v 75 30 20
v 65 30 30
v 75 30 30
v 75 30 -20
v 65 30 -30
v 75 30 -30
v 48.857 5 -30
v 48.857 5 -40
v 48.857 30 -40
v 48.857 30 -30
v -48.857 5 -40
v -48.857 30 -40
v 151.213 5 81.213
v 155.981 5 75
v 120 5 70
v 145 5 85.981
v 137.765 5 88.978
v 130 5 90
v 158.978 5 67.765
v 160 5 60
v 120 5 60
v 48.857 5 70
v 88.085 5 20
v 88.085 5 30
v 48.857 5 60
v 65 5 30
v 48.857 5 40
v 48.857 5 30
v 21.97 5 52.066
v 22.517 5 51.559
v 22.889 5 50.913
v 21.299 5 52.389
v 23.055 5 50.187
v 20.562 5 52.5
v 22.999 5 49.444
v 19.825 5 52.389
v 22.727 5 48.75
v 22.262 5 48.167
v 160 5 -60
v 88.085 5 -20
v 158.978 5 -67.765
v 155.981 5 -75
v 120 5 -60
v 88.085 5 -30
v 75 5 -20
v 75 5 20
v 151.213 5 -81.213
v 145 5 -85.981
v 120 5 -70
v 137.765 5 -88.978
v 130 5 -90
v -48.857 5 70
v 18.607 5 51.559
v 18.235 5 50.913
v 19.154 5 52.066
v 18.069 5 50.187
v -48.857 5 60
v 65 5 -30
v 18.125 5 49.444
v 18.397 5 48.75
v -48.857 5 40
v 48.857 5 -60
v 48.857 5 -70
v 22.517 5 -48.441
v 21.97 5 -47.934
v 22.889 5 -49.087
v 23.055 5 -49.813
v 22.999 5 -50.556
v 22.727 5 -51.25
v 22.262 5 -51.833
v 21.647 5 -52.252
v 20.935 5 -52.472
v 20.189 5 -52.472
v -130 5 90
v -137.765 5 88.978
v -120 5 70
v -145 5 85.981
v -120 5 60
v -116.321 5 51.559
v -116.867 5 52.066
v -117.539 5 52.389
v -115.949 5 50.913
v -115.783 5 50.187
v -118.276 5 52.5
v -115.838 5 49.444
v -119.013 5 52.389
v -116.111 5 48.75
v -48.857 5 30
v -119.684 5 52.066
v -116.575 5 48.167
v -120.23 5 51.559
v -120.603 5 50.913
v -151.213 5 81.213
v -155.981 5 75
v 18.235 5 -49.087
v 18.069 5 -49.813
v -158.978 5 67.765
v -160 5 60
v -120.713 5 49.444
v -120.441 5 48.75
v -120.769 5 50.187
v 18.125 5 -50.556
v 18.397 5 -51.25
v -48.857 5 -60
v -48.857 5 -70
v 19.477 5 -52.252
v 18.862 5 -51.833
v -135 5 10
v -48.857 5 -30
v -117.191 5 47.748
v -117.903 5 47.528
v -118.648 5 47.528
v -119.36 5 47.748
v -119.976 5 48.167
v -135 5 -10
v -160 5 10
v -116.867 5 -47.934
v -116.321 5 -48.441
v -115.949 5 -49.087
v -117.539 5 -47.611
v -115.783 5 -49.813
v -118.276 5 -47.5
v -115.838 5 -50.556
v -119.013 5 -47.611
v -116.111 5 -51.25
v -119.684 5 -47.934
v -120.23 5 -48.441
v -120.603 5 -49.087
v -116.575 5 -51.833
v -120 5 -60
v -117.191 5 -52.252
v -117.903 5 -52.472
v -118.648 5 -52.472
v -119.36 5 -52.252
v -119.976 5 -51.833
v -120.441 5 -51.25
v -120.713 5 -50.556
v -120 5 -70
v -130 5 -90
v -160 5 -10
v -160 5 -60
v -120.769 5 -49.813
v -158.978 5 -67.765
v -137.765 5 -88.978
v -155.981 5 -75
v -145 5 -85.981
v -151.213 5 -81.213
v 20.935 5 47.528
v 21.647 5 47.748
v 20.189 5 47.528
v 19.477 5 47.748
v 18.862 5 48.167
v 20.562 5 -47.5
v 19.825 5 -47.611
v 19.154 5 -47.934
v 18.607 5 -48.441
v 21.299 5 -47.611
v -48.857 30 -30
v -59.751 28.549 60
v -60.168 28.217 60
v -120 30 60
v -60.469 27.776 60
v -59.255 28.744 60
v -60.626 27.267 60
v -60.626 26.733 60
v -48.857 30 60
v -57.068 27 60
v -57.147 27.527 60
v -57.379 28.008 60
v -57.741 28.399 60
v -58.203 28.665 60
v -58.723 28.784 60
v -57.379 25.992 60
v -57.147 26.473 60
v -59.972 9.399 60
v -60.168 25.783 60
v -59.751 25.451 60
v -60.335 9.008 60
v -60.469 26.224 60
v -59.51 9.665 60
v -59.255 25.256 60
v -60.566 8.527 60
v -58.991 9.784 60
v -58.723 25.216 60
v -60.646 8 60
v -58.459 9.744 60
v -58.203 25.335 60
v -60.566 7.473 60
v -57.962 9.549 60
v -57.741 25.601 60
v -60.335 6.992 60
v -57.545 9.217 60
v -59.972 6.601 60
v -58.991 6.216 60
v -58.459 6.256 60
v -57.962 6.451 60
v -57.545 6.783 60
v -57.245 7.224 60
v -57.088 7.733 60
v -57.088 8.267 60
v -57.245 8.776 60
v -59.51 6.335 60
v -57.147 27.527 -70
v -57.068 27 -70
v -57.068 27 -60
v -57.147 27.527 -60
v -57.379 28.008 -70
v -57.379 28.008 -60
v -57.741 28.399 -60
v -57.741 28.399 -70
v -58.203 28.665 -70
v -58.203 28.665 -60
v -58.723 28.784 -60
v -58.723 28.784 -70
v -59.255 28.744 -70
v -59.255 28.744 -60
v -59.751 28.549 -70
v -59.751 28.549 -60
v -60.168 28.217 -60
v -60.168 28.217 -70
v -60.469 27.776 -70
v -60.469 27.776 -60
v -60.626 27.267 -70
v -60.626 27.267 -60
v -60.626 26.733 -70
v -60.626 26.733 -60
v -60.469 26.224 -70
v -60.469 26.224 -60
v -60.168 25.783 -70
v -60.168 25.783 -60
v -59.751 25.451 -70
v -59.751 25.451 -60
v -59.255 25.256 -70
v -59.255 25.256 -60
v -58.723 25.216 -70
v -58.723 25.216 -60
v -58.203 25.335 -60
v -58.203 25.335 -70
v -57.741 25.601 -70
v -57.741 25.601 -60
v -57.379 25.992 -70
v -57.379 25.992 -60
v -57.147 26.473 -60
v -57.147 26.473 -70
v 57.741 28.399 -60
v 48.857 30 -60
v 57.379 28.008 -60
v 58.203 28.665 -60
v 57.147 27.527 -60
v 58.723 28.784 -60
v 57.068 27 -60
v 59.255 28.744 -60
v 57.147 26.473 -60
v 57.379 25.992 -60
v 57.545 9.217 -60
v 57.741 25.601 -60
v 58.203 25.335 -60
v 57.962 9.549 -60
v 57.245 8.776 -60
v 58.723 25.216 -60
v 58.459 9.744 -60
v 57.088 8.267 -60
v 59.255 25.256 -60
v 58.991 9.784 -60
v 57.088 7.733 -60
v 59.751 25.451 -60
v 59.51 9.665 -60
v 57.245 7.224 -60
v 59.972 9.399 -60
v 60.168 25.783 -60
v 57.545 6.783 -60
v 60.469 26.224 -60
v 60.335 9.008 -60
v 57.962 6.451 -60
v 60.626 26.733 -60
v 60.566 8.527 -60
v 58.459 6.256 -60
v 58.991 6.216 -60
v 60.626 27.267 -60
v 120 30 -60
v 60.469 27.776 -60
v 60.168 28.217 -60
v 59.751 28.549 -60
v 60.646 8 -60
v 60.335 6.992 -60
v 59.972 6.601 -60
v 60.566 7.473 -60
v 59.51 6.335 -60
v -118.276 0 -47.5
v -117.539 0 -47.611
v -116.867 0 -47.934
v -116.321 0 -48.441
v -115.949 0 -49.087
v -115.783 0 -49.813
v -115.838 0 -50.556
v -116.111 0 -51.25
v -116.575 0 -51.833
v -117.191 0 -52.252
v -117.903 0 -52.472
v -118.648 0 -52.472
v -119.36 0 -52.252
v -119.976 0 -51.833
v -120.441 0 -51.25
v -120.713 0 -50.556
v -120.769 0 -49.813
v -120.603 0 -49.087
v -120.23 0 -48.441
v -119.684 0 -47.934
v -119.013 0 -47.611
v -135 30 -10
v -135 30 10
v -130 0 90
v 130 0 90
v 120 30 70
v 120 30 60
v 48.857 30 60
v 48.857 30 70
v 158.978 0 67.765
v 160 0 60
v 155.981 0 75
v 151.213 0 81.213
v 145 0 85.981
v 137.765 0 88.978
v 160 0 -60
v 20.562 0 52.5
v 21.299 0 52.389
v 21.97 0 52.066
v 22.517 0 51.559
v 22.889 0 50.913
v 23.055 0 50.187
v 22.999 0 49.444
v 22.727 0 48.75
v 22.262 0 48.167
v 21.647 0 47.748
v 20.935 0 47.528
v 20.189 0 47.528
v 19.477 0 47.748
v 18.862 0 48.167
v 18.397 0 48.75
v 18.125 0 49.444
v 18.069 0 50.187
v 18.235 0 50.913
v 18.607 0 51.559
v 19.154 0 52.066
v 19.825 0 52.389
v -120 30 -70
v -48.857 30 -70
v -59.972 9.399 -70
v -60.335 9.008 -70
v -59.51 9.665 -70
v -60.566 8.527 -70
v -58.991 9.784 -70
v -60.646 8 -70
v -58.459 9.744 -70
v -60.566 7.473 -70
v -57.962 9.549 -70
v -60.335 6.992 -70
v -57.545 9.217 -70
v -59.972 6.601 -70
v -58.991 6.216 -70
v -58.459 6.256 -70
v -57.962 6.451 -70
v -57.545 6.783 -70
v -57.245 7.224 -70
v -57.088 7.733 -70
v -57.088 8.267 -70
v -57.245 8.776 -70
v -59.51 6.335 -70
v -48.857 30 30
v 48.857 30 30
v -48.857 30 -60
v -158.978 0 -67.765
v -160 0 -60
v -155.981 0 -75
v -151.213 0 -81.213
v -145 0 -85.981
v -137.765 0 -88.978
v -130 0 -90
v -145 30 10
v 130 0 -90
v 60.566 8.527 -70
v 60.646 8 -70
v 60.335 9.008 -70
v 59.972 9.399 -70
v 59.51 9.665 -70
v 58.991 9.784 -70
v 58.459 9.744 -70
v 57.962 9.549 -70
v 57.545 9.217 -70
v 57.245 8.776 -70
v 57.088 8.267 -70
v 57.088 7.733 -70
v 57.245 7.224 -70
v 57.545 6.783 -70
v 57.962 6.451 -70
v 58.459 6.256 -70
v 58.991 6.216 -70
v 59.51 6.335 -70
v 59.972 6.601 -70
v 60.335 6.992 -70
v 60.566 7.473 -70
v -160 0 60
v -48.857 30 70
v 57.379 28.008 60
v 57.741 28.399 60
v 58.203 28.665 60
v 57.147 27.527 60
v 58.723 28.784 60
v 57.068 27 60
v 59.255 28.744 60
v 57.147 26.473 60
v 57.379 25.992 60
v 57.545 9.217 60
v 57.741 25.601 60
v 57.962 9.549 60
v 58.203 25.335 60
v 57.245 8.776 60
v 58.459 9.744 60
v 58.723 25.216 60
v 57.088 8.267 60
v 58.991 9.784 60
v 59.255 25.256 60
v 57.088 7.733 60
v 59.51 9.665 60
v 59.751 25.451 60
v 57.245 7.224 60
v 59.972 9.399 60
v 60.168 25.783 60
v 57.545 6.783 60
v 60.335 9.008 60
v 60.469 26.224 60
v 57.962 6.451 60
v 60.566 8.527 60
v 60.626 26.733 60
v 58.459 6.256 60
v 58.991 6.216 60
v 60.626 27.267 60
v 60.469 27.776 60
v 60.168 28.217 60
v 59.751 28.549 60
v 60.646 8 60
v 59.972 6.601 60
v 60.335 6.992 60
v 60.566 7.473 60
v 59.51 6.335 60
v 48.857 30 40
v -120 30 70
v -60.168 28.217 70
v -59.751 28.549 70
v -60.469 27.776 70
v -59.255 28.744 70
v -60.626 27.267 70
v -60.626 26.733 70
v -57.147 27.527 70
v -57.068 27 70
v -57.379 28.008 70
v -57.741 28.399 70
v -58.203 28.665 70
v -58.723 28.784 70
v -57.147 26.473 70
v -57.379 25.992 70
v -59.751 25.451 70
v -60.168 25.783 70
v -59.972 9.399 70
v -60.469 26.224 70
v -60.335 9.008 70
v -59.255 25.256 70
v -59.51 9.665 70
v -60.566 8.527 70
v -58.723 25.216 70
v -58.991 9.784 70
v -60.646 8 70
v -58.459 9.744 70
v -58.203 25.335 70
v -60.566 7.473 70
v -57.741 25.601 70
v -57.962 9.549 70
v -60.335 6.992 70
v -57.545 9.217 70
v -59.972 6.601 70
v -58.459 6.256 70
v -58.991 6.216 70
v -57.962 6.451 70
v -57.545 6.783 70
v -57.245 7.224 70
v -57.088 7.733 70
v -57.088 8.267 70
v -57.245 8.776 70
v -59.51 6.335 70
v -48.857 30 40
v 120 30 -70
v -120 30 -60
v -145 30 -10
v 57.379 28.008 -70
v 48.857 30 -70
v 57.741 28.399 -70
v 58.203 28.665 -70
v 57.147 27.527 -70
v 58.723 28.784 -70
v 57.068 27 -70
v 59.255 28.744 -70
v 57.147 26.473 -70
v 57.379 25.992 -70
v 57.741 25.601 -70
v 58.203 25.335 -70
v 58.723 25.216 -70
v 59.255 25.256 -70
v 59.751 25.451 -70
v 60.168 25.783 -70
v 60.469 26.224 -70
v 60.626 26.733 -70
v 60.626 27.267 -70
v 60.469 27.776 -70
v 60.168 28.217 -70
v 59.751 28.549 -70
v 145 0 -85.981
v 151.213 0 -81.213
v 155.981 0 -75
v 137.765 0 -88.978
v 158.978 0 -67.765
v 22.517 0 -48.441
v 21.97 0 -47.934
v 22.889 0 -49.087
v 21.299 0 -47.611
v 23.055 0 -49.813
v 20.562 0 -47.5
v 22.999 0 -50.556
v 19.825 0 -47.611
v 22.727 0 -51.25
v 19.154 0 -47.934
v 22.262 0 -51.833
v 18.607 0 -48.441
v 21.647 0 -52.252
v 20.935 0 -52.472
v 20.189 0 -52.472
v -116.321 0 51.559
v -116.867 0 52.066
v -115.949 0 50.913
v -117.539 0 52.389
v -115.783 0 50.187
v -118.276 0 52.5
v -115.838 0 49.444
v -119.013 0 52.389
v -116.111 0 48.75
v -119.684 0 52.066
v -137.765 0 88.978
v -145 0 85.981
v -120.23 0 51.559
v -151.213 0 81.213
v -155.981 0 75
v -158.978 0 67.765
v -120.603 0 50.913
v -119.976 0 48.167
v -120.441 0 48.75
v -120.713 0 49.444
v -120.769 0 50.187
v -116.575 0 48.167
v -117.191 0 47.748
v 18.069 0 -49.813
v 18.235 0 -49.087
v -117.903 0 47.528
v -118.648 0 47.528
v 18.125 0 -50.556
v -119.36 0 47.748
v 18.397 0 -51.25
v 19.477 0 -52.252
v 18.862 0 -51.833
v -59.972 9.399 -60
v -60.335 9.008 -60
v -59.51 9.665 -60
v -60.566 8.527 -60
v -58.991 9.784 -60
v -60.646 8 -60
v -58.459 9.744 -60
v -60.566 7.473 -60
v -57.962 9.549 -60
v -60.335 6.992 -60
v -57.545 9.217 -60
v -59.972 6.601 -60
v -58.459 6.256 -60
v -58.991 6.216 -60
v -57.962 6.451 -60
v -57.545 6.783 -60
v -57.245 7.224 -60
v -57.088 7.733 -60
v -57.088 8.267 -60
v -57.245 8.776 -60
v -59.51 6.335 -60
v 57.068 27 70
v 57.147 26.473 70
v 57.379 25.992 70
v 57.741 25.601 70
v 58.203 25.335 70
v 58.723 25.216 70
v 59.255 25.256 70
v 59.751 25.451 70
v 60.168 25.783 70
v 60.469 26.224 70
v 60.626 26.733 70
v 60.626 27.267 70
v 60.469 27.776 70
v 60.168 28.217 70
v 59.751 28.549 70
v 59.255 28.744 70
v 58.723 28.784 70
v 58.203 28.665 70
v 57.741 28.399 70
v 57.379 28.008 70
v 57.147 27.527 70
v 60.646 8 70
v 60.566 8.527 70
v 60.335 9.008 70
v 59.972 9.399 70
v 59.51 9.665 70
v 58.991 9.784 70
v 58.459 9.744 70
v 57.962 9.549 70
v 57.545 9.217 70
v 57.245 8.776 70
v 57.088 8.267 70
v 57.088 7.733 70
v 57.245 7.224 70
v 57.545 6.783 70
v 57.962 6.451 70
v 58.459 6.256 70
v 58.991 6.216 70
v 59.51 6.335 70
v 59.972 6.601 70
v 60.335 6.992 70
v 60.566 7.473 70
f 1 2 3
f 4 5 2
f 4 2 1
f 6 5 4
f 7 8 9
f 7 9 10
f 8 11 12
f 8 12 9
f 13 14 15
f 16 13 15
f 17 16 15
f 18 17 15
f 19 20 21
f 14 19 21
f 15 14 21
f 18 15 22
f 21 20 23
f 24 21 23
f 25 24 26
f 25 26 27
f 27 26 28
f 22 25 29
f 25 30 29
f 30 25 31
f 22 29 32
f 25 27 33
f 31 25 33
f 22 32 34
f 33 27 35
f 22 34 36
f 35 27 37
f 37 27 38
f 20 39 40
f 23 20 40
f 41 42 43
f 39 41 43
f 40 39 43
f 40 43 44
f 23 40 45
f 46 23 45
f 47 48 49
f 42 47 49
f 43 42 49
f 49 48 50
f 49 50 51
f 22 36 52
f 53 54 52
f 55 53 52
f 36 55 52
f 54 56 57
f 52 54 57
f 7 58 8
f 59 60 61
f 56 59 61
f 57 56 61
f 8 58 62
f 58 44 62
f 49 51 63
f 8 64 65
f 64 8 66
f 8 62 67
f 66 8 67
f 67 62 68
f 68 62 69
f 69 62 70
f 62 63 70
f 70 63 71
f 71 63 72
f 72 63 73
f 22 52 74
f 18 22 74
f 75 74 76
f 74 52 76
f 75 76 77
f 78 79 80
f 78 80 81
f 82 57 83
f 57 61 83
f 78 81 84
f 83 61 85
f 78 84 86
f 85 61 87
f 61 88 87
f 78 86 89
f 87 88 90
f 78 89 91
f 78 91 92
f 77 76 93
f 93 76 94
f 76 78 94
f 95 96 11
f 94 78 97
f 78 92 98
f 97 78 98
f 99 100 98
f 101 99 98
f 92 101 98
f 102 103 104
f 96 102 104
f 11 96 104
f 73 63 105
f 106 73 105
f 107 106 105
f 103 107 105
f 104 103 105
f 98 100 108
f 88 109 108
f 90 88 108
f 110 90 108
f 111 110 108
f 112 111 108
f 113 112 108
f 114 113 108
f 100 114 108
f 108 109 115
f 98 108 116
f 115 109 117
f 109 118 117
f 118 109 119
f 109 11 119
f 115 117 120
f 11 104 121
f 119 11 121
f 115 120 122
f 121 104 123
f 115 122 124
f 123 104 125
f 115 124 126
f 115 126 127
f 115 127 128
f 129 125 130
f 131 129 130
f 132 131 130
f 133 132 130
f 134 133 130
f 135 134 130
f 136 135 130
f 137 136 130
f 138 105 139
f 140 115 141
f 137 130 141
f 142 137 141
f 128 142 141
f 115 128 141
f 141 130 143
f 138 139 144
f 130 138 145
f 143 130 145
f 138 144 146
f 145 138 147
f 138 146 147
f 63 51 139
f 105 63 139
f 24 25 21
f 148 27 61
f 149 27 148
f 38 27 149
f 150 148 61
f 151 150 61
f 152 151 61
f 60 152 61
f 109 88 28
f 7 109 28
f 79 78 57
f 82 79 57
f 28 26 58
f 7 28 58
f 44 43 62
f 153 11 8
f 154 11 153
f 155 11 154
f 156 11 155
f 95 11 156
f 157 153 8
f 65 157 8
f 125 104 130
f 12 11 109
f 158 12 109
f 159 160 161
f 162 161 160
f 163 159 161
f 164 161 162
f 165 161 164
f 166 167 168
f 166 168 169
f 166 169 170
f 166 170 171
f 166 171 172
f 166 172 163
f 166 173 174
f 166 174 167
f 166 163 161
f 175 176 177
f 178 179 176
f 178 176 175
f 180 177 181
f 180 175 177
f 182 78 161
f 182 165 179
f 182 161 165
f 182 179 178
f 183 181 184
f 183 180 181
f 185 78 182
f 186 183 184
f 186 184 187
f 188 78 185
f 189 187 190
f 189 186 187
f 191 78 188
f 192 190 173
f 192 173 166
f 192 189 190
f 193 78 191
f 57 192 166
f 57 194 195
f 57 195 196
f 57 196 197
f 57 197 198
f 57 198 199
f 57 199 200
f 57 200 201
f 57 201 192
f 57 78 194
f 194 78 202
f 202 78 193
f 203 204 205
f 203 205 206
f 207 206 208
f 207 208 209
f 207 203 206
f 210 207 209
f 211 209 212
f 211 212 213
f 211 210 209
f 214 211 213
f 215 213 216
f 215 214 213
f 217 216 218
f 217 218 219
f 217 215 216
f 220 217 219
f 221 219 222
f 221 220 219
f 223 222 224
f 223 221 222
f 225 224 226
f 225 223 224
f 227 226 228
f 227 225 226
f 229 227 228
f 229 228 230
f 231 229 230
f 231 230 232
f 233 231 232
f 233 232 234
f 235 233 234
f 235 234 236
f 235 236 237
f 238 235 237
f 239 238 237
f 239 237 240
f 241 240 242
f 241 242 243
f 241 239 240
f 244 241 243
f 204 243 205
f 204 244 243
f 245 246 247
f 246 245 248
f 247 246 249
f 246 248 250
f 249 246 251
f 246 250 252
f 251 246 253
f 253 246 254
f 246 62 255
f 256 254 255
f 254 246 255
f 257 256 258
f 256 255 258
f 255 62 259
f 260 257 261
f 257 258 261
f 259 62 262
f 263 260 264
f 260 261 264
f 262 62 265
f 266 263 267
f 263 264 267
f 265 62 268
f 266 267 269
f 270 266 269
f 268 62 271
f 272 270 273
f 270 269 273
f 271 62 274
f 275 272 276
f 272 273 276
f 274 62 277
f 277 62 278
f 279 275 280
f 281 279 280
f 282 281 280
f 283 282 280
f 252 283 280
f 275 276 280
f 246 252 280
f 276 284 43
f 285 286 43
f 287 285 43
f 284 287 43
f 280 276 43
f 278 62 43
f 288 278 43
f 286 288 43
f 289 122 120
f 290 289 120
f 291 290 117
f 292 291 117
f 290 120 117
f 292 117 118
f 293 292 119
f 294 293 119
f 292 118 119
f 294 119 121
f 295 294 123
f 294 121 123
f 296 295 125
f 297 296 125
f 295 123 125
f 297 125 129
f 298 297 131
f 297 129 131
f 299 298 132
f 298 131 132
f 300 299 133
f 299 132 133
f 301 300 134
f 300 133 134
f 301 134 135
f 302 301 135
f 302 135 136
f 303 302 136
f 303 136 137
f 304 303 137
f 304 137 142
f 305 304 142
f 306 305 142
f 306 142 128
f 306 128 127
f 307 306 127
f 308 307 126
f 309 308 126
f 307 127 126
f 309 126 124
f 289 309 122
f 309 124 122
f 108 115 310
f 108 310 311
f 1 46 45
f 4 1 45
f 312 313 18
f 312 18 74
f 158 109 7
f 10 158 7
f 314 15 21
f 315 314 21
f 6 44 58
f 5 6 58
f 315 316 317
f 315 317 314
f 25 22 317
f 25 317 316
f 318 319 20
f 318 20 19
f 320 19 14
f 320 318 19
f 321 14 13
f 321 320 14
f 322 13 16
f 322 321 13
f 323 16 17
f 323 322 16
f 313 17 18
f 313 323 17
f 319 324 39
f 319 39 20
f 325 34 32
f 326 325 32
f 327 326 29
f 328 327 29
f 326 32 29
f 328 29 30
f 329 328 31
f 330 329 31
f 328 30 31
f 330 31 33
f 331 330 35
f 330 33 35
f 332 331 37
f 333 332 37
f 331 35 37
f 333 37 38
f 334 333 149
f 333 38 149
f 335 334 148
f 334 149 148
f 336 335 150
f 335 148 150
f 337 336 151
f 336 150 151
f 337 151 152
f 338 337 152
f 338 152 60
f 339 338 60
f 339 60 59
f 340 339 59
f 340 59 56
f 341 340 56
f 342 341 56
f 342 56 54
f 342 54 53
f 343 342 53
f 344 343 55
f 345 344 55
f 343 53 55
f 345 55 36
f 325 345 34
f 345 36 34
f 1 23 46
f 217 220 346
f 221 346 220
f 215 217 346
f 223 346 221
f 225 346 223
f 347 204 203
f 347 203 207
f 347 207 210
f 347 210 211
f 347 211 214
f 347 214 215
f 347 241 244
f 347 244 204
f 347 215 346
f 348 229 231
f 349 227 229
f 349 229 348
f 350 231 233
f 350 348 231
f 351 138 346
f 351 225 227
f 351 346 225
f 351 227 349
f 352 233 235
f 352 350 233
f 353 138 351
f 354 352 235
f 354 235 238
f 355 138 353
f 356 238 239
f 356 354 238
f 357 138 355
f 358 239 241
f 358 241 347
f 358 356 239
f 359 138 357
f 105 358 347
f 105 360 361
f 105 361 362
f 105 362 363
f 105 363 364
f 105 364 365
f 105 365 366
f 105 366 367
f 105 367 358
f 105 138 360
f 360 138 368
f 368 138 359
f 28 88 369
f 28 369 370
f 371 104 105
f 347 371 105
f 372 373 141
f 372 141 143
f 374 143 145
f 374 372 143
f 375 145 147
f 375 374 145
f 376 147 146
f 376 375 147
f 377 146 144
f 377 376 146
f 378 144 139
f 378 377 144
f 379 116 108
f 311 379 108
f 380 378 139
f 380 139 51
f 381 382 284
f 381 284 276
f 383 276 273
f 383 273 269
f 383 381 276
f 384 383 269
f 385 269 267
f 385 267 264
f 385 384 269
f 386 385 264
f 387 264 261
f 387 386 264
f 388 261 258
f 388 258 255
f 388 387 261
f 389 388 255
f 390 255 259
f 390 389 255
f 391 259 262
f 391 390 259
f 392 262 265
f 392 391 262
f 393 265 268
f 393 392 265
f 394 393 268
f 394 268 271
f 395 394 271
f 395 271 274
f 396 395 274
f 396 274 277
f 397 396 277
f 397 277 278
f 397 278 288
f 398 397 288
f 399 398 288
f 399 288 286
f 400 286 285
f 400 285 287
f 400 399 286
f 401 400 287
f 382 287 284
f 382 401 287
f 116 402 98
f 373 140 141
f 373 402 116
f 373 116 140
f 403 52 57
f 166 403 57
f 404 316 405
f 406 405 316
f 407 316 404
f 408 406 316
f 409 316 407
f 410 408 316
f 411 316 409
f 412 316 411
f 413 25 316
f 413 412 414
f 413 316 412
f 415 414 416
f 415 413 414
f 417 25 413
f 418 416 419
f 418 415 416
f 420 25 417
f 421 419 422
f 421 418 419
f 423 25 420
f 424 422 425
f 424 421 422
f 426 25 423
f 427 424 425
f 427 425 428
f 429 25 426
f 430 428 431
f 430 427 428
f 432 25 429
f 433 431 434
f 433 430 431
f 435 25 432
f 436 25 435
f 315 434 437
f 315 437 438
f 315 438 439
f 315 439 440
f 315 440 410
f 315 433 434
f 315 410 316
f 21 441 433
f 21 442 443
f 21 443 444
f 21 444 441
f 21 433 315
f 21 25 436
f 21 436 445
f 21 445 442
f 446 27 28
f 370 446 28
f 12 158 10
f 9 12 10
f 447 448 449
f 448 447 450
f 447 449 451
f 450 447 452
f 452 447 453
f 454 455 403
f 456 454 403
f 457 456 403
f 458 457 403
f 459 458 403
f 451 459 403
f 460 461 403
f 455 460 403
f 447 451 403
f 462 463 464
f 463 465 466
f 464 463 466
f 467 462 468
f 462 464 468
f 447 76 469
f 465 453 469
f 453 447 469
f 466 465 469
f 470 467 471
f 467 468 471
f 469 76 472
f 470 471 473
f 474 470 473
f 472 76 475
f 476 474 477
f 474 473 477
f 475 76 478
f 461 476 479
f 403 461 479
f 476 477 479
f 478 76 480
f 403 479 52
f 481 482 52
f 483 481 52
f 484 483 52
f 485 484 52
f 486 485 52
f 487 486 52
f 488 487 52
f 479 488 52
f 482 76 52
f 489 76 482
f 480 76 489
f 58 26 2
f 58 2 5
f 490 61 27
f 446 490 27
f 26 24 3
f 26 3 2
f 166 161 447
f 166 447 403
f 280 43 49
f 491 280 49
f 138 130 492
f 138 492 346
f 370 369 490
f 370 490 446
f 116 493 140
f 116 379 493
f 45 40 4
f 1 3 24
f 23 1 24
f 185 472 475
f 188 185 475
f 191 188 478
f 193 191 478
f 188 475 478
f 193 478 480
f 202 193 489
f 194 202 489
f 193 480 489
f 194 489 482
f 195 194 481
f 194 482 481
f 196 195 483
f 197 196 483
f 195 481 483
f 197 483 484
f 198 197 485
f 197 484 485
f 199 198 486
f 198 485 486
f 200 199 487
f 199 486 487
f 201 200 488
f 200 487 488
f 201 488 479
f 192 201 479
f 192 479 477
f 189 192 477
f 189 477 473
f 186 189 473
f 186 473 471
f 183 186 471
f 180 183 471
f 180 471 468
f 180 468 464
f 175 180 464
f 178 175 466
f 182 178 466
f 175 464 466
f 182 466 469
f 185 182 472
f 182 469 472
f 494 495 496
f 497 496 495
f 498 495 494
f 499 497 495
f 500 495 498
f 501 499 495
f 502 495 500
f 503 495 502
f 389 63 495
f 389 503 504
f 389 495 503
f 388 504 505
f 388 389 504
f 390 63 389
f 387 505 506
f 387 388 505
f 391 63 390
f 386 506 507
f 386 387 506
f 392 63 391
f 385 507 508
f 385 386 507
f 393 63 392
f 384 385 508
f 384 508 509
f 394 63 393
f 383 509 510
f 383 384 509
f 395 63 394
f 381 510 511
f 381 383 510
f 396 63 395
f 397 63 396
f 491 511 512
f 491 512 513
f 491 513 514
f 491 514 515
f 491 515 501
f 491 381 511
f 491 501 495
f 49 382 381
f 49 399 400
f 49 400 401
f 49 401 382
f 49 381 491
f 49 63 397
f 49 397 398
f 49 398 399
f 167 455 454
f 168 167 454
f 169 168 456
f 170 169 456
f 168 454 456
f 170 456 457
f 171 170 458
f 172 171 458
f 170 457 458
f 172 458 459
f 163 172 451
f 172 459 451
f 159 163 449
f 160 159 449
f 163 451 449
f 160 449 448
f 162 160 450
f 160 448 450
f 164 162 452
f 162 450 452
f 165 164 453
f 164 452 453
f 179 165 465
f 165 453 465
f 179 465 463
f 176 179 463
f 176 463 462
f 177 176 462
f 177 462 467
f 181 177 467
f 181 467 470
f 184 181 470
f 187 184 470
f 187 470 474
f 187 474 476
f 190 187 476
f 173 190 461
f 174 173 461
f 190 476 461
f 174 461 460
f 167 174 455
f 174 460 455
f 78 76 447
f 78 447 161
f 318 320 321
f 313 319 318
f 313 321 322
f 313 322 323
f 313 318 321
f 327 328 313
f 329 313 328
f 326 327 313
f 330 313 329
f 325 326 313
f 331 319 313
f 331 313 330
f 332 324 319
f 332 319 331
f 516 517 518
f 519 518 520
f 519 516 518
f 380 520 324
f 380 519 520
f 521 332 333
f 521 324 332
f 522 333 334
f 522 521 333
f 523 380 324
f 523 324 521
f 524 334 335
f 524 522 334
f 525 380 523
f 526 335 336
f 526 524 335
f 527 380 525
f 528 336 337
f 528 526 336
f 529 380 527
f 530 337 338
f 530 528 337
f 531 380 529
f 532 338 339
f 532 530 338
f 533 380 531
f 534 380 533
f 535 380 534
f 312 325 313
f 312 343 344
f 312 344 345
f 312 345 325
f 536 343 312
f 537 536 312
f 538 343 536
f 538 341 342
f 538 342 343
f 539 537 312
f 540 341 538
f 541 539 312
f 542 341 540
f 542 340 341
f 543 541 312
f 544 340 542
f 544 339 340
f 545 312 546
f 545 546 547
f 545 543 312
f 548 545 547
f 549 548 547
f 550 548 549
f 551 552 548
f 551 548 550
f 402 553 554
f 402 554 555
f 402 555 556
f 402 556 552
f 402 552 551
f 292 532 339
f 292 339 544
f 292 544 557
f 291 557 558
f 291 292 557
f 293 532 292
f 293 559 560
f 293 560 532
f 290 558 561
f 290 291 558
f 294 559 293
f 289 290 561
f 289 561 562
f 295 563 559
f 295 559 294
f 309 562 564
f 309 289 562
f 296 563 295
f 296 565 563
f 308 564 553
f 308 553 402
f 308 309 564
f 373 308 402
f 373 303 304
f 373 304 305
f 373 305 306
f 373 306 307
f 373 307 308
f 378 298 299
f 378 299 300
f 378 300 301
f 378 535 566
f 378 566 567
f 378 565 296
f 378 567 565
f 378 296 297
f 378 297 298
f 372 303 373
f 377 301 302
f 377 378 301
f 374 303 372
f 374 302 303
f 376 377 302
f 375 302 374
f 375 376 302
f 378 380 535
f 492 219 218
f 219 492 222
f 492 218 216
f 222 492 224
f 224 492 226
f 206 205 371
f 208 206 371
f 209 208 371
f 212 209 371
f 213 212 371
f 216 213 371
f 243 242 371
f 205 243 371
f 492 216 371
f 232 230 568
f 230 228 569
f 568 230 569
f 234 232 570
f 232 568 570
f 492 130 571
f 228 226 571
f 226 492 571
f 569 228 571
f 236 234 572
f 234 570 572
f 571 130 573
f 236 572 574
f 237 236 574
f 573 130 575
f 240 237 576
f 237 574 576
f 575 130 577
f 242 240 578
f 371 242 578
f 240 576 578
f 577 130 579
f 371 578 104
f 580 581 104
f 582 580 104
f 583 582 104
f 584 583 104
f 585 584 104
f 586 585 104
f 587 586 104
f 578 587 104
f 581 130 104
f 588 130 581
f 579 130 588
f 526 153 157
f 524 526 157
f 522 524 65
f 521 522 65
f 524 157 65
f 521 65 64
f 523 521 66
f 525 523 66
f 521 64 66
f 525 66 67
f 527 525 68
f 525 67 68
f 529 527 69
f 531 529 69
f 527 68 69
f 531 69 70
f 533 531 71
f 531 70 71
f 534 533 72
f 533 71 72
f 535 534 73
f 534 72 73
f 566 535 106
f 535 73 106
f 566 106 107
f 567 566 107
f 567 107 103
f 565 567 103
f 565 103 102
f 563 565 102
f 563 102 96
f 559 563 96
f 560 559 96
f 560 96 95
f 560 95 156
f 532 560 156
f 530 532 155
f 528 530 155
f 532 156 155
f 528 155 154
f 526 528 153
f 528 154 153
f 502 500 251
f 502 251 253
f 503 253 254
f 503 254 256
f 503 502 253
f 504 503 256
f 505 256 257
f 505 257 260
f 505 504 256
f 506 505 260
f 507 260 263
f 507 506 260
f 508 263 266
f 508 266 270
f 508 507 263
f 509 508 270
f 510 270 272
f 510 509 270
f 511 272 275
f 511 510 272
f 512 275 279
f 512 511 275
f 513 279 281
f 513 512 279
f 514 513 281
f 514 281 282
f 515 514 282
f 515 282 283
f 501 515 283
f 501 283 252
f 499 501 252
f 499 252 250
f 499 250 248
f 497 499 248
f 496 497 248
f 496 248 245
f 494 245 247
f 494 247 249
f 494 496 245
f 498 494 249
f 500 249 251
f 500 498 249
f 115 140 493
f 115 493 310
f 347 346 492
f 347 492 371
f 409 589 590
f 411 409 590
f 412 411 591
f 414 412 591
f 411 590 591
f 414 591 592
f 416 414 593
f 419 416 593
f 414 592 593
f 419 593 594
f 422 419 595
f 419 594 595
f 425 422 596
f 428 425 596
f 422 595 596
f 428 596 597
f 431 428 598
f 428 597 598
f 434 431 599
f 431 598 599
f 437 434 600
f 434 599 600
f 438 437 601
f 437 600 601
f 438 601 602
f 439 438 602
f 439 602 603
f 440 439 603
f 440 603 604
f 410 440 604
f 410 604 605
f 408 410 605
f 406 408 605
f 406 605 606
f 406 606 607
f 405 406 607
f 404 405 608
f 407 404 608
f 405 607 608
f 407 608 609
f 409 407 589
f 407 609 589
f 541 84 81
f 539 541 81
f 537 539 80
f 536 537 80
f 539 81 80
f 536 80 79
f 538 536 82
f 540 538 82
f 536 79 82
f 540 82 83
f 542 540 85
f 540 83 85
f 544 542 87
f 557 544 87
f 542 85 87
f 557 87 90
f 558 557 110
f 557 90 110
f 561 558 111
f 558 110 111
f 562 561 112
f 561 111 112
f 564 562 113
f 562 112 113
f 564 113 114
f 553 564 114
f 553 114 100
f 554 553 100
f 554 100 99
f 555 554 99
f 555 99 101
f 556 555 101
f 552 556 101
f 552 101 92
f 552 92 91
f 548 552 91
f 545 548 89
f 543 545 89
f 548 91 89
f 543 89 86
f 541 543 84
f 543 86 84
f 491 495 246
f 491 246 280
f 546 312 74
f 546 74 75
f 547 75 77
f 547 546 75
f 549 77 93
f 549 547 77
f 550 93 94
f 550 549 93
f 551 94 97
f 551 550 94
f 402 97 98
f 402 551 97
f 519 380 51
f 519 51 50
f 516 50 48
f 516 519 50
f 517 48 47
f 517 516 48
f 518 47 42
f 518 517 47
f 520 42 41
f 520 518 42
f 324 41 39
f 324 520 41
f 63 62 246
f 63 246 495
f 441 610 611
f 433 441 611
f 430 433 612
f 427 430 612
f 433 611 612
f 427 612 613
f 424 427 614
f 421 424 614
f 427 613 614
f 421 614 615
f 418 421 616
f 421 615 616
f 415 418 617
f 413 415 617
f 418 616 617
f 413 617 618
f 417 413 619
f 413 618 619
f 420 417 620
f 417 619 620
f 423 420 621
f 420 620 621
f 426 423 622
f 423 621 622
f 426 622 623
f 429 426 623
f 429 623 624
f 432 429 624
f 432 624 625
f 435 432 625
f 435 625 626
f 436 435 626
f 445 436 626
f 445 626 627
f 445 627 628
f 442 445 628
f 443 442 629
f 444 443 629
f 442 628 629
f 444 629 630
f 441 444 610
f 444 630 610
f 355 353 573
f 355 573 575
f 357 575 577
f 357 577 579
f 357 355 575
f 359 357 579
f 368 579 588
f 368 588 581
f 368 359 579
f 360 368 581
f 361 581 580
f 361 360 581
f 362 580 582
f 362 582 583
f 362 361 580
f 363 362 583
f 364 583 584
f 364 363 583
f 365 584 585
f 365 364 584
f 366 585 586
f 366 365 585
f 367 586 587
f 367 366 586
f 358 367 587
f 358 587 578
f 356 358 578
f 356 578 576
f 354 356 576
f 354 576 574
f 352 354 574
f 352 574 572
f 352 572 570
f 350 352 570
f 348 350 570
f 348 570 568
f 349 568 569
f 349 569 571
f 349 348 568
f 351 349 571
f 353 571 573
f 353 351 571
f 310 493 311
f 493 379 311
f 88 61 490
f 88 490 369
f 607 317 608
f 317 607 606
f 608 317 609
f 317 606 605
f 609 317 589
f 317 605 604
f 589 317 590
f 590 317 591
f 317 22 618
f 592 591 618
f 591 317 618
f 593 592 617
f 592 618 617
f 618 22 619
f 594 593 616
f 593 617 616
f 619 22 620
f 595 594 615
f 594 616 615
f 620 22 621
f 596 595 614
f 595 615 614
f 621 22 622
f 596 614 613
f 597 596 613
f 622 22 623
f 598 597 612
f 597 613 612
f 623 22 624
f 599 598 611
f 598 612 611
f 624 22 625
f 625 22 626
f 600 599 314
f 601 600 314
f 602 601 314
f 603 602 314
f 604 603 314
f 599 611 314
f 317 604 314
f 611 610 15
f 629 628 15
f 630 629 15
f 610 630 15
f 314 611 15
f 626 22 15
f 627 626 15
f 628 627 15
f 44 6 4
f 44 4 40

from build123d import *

# Parameters (mm, degrees)
BOSS_EXTRUDE1_DEPTH = 5
SKETCH2_W           = 71.143127042
SKETCH2_H           = 10
BOSS_EXTRUDE3_DEPTH = 25
SKETCH3_W           = 10
SKETCH3_H           = 10
BOSS_EXTRUDE4_DEPTH = 25
BOSS_EXTRUDE5_DEPTH = 10
SKETCH6_W           = 10
SKETCH6_H           = 60
BOSS_EXTRUDE6_DEPTH = 25
BOSS_EXTRUDE7_DEPTH = 10
SKETCH9_W           = 97.713745916
SKETCH9_H           = 10
BOSS_EXTRUDE8_DEPTH = 25
SKETCH11_R          = 2.5
CUT_EXTRUDE1_DEPTH  = 5
SKETCH12_R          = 1.788924299
CUT_EXTRUDE2_DEPTH  = 10


with BuildPart() as part:
    # Sketch1 → Boss-Extrude1 (new body)
    with BuildSketch(Plane(origin=(0, 0, 0), x_dir=(1, 0, 0), z_dir=(0, 1, 0))):
        with BuildLine():
            Line((-130, 90), (130, 90))
            ThreePointArc((130, 90), (151.213203436, 81.213203436), (160, 60))
            Line((160, 60), (160, -60))
            ThreePointArc((160, -60), (151.213203436, -81.213203436), (130, -90))
            Line((130, -90), (-130, -90))
            ThreePointArc((-130, -90), (-151.213203436, -81.213203436), (-160, -60))
            Line((-160, -60), (-160, 60))
            ThreePointArc((-160, 60), (-151.213203436, 81.213203436), (-130, 90))
        make_face()
    extrude(amount=BOSS_EXTRUDE1_DEPTH)

    # Sketch2 → Boss-Extrude3 (add)
    with BuildSketch(Plane(origin=(0, 5, 0), x_dir=(1, 0, 0), z_dir=(0, 1, 0))):
        with Locations((-84.428436479, 65)):
            Rectangle(SKETCH2_W, SKETCH2_H)
        with Locations((84.428436479, 65)):
            Rectangle(SKETCH2_W, SKETCH2_H)
        with Locations((84.428436479, -65)):
            Rectangle(SKETCH2_W, SKETCH2_H)
        with Locations((-84.428436479, -65)):
            Rectangle(SKETCH2_W, SKETCH2_H)
    extrude(amount=BOSS_EXTRUDE3_DEPTH)

    # Sketch3 → Boss-Extrude4 (add)
    with BuildSketch(Plane(origin=(0, 5, 0), x_dir=(1, 0, 0), z_dir=(0, 1, 0))):
        with Locations((-140, -5)):
            Rectangle(SKETCH3_W, SKETCH3_H)
    boss_extrude4 = extrude(amount=BOSS_EXTRUDE4_DEPTH)

    # Sketch5 → Boss-Extrude5 (add)
    with BuildSketch(Plane(origin=(0, 0, 0), x_dir=(-1, 0, 0), z_dir=(0, 0, -1))):
        Polygon((145, 5), (145, 30), (160, 5), align=None)
    boss_extrude5 = extrude(amount=-BOSS_EXTRUDE5_DEPTH)

    # Sketch6 → Boss-Extrude6 (add)
    with BuildSketch(Plane(origin=(0, 5, 0), x_dir=(1, 0, 0), z_dir=(0, 1, 0))):
        with Locations((70, 0)):
            Rectangle(SKETCH6_W, SKETCH6_H)
    extrude(amount=BOSS_EXTRUDE6_DEPTH)

    # Sketch8 → Boss-Extrude7 (add)
    with BuildSketch(Plane.XY.offset(30)):
        Polygon((75, 30), (88.085238775, 5), (75, 5), align=None)
    boss_extrude7 = extrude(amount=-BOSS_EXTRUDE7_DEPTH)

    # Mirror1: Boss-Extrude7 across plane
    add(boss_extrude7.mirror(Plane(origin=(0, 0, 0), x_dir=(1, 0, 0), z_dir=(0, 0, -1))))

    # Mirror2: Boss-Extrude4, Boss-Extrude5 across plane
    add(boss_extrude4.mirror(Plane(origin=(-145, 30, 0), x_dir=(1, 0, 0), z_dir=(0, 0, 1))))
    add(boss_extrude5.mirror(Plane(origin=(-145, 30, 0), x_dir=(1, 0, 0), z_dir=(0, 0, 1))))

    # Sketch9 → Boss-Extrude8 (add)
    with BuildSketch(Plane(origin=(0, 5, 0), x_dir=(1, 0, 0), z_dir=(0, 1, 0))):
        with Locations((0, -35)):
            Rectangle(SKETCH9_W, SKETCH9_H)
    boss_extrude8 = extrude(amount=BOSS_EXTRUDE8_DEPTH)

    # Mirror3: Boss-Extrude8 across plane
    add(boss_extrude8.mirror(Plane(origin=(0, 0, 0), x_dir=(1, 0, 0), z_dir=(0, 0, -1))))

    # Sketch11 → Cut-Extrude1 (cut)
    with BuildSketch(Plane(origin=(0, 5, 0), x_dir=(1, 0, 0), z_dir=(0, 1, 0))):
        with Locations(Location((-118.275690488, 50, 0), (0, 0, 270))):
            Circle(SKETCH11_R)
        with Locations(Location((-118.275690488, -50, 0), (0, 0, 270))):
            Circle(SKETCH11_R)
        with Locations(Location((20.561944572, -50, 0), (0, 0, 270))):
            Circle(SKETCH11_R)
        with Locations(Location((20.561944572, 50, 0), (0, 0, 270))):
            Circle(SKETCH11_R)
    extrude(amount=-CUT_EXTRUDE1_DEPTH, mode=Mode.SUBTRACT)

    # Sketch12 → Cut-Extrude2 (cut)
    with BuildSketch(Plane.XY.offset(70)):
        with Locations((-58.856872958, 27)):
            Circle(SKETCH12_R)
        with Locations(Location((-58.856872958, 8, 0), (0, 0, 180))):
            Circle(SKETCH12_R)
        with Locations((58.856872958, 8)):
            Circle(SKETCH12_R)
        with Locations(Location((58.856872958, 27, 0), (0, 0, 180))):
            Circle(SKETCH12_R)
    cut_extrude2 = extrude(amount=-CUT_EXTRUDE2_DEPTH, mode=Mode.SUBTRACT)

    # Mirror4: Cut-Extrude2 across plane
    add(cut_extrude2.mirror(Plane.XY), mode=Mode.SUBTRACT)


solid = part.part
